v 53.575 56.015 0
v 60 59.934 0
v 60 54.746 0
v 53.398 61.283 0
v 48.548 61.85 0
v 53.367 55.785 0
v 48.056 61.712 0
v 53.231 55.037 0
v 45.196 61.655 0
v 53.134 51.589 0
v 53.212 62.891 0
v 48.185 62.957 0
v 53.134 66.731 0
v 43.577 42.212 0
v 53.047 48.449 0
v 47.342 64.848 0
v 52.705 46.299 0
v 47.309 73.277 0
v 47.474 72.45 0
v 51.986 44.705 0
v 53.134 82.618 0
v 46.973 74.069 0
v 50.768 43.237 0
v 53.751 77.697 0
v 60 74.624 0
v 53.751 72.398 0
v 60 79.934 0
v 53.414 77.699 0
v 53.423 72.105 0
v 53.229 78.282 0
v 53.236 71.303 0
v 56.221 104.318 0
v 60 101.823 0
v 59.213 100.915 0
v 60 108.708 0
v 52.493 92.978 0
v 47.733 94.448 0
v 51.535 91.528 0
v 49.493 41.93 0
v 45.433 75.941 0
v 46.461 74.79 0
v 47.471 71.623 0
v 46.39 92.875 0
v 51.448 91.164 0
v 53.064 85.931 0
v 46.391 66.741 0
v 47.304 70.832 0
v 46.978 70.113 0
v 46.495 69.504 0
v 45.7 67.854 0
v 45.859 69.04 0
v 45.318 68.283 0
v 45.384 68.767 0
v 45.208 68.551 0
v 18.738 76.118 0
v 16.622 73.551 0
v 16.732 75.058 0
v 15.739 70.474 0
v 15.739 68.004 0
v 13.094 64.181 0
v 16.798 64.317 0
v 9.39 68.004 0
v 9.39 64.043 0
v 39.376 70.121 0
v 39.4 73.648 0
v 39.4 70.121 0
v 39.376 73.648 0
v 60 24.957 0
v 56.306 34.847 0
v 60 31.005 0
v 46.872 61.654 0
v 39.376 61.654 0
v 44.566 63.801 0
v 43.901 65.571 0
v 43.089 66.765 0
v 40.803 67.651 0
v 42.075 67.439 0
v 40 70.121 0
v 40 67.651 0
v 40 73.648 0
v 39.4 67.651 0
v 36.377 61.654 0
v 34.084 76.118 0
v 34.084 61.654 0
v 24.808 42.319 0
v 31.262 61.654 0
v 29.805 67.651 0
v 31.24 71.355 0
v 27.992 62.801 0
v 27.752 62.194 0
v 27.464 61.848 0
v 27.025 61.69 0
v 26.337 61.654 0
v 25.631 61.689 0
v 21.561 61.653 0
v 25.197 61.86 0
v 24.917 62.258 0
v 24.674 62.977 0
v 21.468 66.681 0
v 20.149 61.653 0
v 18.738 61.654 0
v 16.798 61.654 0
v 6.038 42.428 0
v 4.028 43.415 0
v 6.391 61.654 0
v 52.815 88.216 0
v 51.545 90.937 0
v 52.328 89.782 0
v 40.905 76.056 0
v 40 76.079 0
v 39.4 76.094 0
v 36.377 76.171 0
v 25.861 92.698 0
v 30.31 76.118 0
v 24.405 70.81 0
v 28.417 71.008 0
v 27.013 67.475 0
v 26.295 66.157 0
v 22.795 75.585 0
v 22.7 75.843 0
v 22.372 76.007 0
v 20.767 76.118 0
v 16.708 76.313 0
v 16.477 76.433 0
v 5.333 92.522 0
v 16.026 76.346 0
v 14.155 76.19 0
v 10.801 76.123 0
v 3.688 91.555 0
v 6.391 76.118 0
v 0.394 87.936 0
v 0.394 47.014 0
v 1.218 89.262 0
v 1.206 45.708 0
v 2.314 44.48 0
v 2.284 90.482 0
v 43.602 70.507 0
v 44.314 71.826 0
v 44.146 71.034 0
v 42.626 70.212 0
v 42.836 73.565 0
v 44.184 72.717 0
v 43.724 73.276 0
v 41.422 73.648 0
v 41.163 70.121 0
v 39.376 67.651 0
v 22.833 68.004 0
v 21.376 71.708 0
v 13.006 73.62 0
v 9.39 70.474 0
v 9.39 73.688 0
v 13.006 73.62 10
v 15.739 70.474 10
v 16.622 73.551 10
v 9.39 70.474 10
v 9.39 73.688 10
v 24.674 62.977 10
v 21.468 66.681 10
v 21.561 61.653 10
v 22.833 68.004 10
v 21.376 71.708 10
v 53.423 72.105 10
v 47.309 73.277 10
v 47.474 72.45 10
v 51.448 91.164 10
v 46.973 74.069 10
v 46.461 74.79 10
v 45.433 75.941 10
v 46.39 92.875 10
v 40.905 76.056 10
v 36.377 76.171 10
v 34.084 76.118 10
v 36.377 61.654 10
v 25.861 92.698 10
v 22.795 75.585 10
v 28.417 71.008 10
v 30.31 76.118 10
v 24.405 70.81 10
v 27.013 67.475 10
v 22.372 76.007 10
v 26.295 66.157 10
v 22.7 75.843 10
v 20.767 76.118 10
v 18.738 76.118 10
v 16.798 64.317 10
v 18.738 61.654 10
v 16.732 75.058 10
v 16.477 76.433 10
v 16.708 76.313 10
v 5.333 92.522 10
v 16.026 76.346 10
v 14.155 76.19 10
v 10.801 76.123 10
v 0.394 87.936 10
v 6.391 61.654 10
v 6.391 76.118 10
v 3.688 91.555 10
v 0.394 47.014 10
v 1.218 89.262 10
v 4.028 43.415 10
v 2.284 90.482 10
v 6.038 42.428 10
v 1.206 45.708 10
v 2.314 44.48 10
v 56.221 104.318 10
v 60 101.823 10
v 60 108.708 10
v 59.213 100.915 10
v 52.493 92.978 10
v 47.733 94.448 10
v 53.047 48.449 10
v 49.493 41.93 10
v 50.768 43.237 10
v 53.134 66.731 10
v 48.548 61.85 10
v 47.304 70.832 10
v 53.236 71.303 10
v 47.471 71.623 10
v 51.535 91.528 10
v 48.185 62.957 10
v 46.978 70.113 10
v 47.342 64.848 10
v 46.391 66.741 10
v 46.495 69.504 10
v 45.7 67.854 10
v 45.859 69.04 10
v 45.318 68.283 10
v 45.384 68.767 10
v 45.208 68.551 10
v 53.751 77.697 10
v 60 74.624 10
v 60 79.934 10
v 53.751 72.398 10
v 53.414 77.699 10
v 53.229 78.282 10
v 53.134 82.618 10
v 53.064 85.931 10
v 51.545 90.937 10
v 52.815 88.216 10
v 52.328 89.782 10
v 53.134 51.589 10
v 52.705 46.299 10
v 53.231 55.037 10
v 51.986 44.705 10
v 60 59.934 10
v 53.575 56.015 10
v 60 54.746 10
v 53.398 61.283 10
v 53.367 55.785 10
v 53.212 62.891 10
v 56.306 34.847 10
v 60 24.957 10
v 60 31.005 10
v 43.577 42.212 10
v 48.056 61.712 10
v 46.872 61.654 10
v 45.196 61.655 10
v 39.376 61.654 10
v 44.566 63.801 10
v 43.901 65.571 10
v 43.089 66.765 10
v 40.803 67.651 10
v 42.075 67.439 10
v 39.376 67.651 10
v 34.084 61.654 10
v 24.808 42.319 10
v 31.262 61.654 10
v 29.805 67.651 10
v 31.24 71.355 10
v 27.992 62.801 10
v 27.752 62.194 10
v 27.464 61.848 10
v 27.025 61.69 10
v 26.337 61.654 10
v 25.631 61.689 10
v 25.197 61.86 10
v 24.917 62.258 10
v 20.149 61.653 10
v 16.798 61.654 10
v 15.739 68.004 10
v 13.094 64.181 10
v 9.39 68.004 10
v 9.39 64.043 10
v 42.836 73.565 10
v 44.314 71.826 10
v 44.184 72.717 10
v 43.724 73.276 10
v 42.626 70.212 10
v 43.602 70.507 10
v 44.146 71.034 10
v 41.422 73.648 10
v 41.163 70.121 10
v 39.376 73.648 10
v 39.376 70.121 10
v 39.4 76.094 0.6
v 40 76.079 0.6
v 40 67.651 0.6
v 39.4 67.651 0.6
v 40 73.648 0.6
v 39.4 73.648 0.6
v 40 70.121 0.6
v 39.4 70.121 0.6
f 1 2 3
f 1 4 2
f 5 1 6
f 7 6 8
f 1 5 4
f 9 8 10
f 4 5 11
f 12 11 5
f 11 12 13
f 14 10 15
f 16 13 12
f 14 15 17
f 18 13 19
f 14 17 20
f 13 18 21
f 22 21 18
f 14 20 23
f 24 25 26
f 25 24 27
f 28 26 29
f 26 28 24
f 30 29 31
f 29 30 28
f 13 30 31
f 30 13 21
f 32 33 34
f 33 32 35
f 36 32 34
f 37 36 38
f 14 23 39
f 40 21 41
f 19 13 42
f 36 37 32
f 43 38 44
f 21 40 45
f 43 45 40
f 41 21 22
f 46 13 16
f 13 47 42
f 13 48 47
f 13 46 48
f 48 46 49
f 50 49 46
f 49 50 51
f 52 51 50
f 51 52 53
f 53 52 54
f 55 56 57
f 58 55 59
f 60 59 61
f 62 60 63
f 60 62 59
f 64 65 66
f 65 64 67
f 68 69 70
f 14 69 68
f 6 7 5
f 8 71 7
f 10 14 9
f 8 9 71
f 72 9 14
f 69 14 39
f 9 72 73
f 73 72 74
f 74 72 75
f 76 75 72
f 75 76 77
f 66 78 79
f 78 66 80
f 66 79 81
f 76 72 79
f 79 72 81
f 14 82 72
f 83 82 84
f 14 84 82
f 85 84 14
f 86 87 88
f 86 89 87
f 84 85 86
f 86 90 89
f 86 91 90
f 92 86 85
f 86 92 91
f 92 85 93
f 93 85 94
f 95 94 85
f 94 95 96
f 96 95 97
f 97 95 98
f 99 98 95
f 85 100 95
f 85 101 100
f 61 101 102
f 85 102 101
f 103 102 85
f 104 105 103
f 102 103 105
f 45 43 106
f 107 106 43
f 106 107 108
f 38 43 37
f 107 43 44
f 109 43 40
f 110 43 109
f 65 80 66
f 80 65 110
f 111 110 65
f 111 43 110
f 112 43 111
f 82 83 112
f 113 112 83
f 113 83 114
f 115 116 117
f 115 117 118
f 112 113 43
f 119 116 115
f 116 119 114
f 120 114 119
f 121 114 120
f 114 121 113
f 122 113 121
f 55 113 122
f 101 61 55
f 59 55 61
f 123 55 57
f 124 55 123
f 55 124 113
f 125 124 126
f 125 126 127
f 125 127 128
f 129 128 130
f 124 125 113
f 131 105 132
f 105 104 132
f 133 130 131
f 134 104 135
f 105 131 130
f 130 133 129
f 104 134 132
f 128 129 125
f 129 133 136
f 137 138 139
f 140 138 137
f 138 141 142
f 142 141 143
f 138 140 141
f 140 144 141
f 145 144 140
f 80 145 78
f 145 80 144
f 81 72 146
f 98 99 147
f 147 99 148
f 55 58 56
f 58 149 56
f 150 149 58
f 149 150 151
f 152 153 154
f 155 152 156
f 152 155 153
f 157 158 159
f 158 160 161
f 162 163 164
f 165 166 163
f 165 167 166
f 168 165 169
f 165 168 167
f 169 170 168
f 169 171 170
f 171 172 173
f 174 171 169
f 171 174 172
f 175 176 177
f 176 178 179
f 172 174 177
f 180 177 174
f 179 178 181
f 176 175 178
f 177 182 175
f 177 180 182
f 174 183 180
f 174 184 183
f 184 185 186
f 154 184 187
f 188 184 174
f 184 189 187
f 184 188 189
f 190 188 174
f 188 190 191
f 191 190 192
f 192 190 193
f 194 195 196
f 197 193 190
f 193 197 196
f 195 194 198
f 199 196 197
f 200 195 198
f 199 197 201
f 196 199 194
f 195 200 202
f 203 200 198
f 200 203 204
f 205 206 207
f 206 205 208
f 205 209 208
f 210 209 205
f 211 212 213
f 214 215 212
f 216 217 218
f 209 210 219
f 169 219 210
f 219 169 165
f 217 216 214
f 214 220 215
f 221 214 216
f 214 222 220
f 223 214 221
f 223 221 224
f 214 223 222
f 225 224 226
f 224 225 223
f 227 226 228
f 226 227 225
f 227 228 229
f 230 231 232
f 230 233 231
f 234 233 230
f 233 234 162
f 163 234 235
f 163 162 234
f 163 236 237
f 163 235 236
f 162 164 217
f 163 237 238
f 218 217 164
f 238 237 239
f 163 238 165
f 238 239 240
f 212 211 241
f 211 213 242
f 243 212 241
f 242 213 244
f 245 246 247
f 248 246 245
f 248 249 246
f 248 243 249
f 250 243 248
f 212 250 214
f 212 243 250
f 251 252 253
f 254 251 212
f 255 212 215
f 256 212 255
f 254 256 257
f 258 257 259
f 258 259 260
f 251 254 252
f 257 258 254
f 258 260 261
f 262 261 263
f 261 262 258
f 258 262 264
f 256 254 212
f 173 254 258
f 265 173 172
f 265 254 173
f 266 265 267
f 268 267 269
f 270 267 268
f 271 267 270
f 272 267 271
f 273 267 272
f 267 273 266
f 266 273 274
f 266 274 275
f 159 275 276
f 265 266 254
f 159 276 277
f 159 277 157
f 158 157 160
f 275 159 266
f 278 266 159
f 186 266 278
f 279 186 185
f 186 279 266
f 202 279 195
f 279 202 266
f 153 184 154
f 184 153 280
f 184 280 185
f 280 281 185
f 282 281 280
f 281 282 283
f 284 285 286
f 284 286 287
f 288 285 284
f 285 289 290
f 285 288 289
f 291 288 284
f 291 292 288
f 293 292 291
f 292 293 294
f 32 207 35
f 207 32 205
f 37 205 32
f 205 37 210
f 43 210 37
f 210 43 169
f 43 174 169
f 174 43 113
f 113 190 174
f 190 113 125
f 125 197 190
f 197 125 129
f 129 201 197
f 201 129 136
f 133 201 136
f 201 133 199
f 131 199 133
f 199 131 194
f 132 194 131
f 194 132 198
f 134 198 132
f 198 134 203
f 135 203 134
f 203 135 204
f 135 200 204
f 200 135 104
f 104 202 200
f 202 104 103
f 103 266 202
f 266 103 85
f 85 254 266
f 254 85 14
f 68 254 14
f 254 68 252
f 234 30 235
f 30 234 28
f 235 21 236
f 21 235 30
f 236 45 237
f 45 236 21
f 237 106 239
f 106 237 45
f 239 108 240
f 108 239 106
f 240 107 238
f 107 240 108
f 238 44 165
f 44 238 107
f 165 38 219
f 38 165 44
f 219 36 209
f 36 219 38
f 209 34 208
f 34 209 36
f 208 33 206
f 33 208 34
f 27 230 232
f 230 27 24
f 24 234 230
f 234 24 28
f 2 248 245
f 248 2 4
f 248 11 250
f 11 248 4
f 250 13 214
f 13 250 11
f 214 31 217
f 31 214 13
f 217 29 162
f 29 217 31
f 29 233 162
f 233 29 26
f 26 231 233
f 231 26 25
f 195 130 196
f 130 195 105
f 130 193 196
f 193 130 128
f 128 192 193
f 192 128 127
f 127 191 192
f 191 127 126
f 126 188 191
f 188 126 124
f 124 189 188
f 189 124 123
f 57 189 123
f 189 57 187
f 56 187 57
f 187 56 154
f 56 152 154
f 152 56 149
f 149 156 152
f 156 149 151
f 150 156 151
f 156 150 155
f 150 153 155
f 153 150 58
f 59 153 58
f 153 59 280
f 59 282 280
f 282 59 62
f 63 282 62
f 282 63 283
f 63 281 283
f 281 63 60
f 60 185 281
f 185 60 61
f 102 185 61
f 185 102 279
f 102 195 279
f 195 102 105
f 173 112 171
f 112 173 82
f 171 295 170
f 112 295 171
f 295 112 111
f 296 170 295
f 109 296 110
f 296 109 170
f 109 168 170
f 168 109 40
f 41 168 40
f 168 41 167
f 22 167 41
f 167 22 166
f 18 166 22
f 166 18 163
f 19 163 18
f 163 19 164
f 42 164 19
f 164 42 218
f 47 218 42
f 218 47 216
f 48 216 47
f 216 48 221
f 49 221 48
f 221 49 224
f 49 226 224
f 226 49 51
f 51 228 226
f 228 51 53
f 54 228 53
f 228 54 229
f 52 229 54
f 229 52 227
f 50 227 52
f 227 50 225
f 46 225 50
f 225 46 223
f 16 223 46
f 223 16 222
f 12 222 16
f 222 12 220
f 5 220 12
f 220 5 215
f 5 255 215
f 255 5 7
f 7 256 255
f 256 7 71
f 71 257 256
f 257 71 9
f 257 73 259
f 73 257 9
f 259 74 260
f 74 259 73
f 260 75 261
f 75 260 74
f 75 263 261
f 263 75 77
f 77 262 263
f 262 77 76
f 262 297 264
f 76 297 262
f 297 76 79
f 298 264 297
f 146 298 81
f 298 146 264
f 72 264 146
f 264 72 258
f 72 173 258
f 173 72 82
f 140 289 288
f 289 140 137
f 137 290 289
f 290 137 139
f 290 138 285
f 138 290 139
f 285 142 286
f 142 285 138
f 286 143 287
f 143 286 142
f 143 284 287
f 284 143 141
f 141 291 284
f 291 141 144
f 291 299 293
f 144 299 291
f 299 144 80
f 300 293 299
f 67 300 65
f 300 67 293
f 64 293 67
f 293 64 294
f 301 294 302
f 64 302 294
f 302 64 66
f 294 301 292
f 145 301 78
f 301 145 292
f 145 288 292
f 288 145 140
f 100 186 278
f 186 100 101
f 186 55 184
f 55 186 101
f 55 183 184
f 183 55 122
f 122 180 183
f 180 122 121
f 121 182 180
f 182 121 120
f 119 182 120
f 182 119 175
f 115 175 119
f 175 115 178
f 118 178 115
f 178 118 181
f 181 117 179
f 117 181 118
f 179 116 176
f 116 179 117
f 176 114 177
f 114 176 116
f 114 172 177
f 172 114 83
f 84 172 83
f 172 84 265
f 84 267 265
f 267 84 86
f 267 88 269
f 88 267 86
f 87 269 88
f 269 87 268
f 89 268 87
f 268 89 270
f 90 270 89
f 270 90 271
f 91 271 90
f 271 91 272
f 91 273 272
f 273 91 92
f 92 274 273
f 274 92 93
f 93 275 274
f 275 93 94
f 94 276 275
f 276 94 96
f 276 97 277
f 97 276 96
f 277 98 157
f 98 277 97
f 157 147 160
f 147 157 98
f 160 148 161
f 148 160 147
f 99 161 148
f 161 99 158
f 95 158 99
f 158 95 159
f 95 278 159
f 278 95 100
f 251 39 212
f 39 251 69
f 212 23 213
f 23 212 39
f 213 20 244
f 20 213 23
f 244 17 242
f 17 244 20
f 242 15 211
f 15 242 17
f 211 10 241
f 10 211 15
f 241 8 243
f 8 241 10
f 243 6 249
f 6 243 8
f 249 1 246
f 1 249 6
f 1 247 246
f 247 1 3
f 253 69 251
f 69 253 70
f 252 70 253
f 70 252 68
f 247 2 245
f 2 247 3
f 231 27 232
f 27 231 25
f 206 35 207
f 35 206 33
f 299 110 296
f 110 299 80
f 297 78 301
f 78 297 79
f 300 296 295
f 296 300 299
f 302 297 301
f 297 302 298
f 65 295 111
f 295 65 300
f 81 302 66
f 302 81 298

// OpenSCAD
union(){
    difference(){
        linear_extrude(height = 10)
        import("EMR_logo_pre_processed.dxf");
        translate([60,-10,-10])
        cube([300,300,30]);
    }
    
    color("blue")
    translate([39.4,65,0])
    cube([.6,15,.6]);
}
